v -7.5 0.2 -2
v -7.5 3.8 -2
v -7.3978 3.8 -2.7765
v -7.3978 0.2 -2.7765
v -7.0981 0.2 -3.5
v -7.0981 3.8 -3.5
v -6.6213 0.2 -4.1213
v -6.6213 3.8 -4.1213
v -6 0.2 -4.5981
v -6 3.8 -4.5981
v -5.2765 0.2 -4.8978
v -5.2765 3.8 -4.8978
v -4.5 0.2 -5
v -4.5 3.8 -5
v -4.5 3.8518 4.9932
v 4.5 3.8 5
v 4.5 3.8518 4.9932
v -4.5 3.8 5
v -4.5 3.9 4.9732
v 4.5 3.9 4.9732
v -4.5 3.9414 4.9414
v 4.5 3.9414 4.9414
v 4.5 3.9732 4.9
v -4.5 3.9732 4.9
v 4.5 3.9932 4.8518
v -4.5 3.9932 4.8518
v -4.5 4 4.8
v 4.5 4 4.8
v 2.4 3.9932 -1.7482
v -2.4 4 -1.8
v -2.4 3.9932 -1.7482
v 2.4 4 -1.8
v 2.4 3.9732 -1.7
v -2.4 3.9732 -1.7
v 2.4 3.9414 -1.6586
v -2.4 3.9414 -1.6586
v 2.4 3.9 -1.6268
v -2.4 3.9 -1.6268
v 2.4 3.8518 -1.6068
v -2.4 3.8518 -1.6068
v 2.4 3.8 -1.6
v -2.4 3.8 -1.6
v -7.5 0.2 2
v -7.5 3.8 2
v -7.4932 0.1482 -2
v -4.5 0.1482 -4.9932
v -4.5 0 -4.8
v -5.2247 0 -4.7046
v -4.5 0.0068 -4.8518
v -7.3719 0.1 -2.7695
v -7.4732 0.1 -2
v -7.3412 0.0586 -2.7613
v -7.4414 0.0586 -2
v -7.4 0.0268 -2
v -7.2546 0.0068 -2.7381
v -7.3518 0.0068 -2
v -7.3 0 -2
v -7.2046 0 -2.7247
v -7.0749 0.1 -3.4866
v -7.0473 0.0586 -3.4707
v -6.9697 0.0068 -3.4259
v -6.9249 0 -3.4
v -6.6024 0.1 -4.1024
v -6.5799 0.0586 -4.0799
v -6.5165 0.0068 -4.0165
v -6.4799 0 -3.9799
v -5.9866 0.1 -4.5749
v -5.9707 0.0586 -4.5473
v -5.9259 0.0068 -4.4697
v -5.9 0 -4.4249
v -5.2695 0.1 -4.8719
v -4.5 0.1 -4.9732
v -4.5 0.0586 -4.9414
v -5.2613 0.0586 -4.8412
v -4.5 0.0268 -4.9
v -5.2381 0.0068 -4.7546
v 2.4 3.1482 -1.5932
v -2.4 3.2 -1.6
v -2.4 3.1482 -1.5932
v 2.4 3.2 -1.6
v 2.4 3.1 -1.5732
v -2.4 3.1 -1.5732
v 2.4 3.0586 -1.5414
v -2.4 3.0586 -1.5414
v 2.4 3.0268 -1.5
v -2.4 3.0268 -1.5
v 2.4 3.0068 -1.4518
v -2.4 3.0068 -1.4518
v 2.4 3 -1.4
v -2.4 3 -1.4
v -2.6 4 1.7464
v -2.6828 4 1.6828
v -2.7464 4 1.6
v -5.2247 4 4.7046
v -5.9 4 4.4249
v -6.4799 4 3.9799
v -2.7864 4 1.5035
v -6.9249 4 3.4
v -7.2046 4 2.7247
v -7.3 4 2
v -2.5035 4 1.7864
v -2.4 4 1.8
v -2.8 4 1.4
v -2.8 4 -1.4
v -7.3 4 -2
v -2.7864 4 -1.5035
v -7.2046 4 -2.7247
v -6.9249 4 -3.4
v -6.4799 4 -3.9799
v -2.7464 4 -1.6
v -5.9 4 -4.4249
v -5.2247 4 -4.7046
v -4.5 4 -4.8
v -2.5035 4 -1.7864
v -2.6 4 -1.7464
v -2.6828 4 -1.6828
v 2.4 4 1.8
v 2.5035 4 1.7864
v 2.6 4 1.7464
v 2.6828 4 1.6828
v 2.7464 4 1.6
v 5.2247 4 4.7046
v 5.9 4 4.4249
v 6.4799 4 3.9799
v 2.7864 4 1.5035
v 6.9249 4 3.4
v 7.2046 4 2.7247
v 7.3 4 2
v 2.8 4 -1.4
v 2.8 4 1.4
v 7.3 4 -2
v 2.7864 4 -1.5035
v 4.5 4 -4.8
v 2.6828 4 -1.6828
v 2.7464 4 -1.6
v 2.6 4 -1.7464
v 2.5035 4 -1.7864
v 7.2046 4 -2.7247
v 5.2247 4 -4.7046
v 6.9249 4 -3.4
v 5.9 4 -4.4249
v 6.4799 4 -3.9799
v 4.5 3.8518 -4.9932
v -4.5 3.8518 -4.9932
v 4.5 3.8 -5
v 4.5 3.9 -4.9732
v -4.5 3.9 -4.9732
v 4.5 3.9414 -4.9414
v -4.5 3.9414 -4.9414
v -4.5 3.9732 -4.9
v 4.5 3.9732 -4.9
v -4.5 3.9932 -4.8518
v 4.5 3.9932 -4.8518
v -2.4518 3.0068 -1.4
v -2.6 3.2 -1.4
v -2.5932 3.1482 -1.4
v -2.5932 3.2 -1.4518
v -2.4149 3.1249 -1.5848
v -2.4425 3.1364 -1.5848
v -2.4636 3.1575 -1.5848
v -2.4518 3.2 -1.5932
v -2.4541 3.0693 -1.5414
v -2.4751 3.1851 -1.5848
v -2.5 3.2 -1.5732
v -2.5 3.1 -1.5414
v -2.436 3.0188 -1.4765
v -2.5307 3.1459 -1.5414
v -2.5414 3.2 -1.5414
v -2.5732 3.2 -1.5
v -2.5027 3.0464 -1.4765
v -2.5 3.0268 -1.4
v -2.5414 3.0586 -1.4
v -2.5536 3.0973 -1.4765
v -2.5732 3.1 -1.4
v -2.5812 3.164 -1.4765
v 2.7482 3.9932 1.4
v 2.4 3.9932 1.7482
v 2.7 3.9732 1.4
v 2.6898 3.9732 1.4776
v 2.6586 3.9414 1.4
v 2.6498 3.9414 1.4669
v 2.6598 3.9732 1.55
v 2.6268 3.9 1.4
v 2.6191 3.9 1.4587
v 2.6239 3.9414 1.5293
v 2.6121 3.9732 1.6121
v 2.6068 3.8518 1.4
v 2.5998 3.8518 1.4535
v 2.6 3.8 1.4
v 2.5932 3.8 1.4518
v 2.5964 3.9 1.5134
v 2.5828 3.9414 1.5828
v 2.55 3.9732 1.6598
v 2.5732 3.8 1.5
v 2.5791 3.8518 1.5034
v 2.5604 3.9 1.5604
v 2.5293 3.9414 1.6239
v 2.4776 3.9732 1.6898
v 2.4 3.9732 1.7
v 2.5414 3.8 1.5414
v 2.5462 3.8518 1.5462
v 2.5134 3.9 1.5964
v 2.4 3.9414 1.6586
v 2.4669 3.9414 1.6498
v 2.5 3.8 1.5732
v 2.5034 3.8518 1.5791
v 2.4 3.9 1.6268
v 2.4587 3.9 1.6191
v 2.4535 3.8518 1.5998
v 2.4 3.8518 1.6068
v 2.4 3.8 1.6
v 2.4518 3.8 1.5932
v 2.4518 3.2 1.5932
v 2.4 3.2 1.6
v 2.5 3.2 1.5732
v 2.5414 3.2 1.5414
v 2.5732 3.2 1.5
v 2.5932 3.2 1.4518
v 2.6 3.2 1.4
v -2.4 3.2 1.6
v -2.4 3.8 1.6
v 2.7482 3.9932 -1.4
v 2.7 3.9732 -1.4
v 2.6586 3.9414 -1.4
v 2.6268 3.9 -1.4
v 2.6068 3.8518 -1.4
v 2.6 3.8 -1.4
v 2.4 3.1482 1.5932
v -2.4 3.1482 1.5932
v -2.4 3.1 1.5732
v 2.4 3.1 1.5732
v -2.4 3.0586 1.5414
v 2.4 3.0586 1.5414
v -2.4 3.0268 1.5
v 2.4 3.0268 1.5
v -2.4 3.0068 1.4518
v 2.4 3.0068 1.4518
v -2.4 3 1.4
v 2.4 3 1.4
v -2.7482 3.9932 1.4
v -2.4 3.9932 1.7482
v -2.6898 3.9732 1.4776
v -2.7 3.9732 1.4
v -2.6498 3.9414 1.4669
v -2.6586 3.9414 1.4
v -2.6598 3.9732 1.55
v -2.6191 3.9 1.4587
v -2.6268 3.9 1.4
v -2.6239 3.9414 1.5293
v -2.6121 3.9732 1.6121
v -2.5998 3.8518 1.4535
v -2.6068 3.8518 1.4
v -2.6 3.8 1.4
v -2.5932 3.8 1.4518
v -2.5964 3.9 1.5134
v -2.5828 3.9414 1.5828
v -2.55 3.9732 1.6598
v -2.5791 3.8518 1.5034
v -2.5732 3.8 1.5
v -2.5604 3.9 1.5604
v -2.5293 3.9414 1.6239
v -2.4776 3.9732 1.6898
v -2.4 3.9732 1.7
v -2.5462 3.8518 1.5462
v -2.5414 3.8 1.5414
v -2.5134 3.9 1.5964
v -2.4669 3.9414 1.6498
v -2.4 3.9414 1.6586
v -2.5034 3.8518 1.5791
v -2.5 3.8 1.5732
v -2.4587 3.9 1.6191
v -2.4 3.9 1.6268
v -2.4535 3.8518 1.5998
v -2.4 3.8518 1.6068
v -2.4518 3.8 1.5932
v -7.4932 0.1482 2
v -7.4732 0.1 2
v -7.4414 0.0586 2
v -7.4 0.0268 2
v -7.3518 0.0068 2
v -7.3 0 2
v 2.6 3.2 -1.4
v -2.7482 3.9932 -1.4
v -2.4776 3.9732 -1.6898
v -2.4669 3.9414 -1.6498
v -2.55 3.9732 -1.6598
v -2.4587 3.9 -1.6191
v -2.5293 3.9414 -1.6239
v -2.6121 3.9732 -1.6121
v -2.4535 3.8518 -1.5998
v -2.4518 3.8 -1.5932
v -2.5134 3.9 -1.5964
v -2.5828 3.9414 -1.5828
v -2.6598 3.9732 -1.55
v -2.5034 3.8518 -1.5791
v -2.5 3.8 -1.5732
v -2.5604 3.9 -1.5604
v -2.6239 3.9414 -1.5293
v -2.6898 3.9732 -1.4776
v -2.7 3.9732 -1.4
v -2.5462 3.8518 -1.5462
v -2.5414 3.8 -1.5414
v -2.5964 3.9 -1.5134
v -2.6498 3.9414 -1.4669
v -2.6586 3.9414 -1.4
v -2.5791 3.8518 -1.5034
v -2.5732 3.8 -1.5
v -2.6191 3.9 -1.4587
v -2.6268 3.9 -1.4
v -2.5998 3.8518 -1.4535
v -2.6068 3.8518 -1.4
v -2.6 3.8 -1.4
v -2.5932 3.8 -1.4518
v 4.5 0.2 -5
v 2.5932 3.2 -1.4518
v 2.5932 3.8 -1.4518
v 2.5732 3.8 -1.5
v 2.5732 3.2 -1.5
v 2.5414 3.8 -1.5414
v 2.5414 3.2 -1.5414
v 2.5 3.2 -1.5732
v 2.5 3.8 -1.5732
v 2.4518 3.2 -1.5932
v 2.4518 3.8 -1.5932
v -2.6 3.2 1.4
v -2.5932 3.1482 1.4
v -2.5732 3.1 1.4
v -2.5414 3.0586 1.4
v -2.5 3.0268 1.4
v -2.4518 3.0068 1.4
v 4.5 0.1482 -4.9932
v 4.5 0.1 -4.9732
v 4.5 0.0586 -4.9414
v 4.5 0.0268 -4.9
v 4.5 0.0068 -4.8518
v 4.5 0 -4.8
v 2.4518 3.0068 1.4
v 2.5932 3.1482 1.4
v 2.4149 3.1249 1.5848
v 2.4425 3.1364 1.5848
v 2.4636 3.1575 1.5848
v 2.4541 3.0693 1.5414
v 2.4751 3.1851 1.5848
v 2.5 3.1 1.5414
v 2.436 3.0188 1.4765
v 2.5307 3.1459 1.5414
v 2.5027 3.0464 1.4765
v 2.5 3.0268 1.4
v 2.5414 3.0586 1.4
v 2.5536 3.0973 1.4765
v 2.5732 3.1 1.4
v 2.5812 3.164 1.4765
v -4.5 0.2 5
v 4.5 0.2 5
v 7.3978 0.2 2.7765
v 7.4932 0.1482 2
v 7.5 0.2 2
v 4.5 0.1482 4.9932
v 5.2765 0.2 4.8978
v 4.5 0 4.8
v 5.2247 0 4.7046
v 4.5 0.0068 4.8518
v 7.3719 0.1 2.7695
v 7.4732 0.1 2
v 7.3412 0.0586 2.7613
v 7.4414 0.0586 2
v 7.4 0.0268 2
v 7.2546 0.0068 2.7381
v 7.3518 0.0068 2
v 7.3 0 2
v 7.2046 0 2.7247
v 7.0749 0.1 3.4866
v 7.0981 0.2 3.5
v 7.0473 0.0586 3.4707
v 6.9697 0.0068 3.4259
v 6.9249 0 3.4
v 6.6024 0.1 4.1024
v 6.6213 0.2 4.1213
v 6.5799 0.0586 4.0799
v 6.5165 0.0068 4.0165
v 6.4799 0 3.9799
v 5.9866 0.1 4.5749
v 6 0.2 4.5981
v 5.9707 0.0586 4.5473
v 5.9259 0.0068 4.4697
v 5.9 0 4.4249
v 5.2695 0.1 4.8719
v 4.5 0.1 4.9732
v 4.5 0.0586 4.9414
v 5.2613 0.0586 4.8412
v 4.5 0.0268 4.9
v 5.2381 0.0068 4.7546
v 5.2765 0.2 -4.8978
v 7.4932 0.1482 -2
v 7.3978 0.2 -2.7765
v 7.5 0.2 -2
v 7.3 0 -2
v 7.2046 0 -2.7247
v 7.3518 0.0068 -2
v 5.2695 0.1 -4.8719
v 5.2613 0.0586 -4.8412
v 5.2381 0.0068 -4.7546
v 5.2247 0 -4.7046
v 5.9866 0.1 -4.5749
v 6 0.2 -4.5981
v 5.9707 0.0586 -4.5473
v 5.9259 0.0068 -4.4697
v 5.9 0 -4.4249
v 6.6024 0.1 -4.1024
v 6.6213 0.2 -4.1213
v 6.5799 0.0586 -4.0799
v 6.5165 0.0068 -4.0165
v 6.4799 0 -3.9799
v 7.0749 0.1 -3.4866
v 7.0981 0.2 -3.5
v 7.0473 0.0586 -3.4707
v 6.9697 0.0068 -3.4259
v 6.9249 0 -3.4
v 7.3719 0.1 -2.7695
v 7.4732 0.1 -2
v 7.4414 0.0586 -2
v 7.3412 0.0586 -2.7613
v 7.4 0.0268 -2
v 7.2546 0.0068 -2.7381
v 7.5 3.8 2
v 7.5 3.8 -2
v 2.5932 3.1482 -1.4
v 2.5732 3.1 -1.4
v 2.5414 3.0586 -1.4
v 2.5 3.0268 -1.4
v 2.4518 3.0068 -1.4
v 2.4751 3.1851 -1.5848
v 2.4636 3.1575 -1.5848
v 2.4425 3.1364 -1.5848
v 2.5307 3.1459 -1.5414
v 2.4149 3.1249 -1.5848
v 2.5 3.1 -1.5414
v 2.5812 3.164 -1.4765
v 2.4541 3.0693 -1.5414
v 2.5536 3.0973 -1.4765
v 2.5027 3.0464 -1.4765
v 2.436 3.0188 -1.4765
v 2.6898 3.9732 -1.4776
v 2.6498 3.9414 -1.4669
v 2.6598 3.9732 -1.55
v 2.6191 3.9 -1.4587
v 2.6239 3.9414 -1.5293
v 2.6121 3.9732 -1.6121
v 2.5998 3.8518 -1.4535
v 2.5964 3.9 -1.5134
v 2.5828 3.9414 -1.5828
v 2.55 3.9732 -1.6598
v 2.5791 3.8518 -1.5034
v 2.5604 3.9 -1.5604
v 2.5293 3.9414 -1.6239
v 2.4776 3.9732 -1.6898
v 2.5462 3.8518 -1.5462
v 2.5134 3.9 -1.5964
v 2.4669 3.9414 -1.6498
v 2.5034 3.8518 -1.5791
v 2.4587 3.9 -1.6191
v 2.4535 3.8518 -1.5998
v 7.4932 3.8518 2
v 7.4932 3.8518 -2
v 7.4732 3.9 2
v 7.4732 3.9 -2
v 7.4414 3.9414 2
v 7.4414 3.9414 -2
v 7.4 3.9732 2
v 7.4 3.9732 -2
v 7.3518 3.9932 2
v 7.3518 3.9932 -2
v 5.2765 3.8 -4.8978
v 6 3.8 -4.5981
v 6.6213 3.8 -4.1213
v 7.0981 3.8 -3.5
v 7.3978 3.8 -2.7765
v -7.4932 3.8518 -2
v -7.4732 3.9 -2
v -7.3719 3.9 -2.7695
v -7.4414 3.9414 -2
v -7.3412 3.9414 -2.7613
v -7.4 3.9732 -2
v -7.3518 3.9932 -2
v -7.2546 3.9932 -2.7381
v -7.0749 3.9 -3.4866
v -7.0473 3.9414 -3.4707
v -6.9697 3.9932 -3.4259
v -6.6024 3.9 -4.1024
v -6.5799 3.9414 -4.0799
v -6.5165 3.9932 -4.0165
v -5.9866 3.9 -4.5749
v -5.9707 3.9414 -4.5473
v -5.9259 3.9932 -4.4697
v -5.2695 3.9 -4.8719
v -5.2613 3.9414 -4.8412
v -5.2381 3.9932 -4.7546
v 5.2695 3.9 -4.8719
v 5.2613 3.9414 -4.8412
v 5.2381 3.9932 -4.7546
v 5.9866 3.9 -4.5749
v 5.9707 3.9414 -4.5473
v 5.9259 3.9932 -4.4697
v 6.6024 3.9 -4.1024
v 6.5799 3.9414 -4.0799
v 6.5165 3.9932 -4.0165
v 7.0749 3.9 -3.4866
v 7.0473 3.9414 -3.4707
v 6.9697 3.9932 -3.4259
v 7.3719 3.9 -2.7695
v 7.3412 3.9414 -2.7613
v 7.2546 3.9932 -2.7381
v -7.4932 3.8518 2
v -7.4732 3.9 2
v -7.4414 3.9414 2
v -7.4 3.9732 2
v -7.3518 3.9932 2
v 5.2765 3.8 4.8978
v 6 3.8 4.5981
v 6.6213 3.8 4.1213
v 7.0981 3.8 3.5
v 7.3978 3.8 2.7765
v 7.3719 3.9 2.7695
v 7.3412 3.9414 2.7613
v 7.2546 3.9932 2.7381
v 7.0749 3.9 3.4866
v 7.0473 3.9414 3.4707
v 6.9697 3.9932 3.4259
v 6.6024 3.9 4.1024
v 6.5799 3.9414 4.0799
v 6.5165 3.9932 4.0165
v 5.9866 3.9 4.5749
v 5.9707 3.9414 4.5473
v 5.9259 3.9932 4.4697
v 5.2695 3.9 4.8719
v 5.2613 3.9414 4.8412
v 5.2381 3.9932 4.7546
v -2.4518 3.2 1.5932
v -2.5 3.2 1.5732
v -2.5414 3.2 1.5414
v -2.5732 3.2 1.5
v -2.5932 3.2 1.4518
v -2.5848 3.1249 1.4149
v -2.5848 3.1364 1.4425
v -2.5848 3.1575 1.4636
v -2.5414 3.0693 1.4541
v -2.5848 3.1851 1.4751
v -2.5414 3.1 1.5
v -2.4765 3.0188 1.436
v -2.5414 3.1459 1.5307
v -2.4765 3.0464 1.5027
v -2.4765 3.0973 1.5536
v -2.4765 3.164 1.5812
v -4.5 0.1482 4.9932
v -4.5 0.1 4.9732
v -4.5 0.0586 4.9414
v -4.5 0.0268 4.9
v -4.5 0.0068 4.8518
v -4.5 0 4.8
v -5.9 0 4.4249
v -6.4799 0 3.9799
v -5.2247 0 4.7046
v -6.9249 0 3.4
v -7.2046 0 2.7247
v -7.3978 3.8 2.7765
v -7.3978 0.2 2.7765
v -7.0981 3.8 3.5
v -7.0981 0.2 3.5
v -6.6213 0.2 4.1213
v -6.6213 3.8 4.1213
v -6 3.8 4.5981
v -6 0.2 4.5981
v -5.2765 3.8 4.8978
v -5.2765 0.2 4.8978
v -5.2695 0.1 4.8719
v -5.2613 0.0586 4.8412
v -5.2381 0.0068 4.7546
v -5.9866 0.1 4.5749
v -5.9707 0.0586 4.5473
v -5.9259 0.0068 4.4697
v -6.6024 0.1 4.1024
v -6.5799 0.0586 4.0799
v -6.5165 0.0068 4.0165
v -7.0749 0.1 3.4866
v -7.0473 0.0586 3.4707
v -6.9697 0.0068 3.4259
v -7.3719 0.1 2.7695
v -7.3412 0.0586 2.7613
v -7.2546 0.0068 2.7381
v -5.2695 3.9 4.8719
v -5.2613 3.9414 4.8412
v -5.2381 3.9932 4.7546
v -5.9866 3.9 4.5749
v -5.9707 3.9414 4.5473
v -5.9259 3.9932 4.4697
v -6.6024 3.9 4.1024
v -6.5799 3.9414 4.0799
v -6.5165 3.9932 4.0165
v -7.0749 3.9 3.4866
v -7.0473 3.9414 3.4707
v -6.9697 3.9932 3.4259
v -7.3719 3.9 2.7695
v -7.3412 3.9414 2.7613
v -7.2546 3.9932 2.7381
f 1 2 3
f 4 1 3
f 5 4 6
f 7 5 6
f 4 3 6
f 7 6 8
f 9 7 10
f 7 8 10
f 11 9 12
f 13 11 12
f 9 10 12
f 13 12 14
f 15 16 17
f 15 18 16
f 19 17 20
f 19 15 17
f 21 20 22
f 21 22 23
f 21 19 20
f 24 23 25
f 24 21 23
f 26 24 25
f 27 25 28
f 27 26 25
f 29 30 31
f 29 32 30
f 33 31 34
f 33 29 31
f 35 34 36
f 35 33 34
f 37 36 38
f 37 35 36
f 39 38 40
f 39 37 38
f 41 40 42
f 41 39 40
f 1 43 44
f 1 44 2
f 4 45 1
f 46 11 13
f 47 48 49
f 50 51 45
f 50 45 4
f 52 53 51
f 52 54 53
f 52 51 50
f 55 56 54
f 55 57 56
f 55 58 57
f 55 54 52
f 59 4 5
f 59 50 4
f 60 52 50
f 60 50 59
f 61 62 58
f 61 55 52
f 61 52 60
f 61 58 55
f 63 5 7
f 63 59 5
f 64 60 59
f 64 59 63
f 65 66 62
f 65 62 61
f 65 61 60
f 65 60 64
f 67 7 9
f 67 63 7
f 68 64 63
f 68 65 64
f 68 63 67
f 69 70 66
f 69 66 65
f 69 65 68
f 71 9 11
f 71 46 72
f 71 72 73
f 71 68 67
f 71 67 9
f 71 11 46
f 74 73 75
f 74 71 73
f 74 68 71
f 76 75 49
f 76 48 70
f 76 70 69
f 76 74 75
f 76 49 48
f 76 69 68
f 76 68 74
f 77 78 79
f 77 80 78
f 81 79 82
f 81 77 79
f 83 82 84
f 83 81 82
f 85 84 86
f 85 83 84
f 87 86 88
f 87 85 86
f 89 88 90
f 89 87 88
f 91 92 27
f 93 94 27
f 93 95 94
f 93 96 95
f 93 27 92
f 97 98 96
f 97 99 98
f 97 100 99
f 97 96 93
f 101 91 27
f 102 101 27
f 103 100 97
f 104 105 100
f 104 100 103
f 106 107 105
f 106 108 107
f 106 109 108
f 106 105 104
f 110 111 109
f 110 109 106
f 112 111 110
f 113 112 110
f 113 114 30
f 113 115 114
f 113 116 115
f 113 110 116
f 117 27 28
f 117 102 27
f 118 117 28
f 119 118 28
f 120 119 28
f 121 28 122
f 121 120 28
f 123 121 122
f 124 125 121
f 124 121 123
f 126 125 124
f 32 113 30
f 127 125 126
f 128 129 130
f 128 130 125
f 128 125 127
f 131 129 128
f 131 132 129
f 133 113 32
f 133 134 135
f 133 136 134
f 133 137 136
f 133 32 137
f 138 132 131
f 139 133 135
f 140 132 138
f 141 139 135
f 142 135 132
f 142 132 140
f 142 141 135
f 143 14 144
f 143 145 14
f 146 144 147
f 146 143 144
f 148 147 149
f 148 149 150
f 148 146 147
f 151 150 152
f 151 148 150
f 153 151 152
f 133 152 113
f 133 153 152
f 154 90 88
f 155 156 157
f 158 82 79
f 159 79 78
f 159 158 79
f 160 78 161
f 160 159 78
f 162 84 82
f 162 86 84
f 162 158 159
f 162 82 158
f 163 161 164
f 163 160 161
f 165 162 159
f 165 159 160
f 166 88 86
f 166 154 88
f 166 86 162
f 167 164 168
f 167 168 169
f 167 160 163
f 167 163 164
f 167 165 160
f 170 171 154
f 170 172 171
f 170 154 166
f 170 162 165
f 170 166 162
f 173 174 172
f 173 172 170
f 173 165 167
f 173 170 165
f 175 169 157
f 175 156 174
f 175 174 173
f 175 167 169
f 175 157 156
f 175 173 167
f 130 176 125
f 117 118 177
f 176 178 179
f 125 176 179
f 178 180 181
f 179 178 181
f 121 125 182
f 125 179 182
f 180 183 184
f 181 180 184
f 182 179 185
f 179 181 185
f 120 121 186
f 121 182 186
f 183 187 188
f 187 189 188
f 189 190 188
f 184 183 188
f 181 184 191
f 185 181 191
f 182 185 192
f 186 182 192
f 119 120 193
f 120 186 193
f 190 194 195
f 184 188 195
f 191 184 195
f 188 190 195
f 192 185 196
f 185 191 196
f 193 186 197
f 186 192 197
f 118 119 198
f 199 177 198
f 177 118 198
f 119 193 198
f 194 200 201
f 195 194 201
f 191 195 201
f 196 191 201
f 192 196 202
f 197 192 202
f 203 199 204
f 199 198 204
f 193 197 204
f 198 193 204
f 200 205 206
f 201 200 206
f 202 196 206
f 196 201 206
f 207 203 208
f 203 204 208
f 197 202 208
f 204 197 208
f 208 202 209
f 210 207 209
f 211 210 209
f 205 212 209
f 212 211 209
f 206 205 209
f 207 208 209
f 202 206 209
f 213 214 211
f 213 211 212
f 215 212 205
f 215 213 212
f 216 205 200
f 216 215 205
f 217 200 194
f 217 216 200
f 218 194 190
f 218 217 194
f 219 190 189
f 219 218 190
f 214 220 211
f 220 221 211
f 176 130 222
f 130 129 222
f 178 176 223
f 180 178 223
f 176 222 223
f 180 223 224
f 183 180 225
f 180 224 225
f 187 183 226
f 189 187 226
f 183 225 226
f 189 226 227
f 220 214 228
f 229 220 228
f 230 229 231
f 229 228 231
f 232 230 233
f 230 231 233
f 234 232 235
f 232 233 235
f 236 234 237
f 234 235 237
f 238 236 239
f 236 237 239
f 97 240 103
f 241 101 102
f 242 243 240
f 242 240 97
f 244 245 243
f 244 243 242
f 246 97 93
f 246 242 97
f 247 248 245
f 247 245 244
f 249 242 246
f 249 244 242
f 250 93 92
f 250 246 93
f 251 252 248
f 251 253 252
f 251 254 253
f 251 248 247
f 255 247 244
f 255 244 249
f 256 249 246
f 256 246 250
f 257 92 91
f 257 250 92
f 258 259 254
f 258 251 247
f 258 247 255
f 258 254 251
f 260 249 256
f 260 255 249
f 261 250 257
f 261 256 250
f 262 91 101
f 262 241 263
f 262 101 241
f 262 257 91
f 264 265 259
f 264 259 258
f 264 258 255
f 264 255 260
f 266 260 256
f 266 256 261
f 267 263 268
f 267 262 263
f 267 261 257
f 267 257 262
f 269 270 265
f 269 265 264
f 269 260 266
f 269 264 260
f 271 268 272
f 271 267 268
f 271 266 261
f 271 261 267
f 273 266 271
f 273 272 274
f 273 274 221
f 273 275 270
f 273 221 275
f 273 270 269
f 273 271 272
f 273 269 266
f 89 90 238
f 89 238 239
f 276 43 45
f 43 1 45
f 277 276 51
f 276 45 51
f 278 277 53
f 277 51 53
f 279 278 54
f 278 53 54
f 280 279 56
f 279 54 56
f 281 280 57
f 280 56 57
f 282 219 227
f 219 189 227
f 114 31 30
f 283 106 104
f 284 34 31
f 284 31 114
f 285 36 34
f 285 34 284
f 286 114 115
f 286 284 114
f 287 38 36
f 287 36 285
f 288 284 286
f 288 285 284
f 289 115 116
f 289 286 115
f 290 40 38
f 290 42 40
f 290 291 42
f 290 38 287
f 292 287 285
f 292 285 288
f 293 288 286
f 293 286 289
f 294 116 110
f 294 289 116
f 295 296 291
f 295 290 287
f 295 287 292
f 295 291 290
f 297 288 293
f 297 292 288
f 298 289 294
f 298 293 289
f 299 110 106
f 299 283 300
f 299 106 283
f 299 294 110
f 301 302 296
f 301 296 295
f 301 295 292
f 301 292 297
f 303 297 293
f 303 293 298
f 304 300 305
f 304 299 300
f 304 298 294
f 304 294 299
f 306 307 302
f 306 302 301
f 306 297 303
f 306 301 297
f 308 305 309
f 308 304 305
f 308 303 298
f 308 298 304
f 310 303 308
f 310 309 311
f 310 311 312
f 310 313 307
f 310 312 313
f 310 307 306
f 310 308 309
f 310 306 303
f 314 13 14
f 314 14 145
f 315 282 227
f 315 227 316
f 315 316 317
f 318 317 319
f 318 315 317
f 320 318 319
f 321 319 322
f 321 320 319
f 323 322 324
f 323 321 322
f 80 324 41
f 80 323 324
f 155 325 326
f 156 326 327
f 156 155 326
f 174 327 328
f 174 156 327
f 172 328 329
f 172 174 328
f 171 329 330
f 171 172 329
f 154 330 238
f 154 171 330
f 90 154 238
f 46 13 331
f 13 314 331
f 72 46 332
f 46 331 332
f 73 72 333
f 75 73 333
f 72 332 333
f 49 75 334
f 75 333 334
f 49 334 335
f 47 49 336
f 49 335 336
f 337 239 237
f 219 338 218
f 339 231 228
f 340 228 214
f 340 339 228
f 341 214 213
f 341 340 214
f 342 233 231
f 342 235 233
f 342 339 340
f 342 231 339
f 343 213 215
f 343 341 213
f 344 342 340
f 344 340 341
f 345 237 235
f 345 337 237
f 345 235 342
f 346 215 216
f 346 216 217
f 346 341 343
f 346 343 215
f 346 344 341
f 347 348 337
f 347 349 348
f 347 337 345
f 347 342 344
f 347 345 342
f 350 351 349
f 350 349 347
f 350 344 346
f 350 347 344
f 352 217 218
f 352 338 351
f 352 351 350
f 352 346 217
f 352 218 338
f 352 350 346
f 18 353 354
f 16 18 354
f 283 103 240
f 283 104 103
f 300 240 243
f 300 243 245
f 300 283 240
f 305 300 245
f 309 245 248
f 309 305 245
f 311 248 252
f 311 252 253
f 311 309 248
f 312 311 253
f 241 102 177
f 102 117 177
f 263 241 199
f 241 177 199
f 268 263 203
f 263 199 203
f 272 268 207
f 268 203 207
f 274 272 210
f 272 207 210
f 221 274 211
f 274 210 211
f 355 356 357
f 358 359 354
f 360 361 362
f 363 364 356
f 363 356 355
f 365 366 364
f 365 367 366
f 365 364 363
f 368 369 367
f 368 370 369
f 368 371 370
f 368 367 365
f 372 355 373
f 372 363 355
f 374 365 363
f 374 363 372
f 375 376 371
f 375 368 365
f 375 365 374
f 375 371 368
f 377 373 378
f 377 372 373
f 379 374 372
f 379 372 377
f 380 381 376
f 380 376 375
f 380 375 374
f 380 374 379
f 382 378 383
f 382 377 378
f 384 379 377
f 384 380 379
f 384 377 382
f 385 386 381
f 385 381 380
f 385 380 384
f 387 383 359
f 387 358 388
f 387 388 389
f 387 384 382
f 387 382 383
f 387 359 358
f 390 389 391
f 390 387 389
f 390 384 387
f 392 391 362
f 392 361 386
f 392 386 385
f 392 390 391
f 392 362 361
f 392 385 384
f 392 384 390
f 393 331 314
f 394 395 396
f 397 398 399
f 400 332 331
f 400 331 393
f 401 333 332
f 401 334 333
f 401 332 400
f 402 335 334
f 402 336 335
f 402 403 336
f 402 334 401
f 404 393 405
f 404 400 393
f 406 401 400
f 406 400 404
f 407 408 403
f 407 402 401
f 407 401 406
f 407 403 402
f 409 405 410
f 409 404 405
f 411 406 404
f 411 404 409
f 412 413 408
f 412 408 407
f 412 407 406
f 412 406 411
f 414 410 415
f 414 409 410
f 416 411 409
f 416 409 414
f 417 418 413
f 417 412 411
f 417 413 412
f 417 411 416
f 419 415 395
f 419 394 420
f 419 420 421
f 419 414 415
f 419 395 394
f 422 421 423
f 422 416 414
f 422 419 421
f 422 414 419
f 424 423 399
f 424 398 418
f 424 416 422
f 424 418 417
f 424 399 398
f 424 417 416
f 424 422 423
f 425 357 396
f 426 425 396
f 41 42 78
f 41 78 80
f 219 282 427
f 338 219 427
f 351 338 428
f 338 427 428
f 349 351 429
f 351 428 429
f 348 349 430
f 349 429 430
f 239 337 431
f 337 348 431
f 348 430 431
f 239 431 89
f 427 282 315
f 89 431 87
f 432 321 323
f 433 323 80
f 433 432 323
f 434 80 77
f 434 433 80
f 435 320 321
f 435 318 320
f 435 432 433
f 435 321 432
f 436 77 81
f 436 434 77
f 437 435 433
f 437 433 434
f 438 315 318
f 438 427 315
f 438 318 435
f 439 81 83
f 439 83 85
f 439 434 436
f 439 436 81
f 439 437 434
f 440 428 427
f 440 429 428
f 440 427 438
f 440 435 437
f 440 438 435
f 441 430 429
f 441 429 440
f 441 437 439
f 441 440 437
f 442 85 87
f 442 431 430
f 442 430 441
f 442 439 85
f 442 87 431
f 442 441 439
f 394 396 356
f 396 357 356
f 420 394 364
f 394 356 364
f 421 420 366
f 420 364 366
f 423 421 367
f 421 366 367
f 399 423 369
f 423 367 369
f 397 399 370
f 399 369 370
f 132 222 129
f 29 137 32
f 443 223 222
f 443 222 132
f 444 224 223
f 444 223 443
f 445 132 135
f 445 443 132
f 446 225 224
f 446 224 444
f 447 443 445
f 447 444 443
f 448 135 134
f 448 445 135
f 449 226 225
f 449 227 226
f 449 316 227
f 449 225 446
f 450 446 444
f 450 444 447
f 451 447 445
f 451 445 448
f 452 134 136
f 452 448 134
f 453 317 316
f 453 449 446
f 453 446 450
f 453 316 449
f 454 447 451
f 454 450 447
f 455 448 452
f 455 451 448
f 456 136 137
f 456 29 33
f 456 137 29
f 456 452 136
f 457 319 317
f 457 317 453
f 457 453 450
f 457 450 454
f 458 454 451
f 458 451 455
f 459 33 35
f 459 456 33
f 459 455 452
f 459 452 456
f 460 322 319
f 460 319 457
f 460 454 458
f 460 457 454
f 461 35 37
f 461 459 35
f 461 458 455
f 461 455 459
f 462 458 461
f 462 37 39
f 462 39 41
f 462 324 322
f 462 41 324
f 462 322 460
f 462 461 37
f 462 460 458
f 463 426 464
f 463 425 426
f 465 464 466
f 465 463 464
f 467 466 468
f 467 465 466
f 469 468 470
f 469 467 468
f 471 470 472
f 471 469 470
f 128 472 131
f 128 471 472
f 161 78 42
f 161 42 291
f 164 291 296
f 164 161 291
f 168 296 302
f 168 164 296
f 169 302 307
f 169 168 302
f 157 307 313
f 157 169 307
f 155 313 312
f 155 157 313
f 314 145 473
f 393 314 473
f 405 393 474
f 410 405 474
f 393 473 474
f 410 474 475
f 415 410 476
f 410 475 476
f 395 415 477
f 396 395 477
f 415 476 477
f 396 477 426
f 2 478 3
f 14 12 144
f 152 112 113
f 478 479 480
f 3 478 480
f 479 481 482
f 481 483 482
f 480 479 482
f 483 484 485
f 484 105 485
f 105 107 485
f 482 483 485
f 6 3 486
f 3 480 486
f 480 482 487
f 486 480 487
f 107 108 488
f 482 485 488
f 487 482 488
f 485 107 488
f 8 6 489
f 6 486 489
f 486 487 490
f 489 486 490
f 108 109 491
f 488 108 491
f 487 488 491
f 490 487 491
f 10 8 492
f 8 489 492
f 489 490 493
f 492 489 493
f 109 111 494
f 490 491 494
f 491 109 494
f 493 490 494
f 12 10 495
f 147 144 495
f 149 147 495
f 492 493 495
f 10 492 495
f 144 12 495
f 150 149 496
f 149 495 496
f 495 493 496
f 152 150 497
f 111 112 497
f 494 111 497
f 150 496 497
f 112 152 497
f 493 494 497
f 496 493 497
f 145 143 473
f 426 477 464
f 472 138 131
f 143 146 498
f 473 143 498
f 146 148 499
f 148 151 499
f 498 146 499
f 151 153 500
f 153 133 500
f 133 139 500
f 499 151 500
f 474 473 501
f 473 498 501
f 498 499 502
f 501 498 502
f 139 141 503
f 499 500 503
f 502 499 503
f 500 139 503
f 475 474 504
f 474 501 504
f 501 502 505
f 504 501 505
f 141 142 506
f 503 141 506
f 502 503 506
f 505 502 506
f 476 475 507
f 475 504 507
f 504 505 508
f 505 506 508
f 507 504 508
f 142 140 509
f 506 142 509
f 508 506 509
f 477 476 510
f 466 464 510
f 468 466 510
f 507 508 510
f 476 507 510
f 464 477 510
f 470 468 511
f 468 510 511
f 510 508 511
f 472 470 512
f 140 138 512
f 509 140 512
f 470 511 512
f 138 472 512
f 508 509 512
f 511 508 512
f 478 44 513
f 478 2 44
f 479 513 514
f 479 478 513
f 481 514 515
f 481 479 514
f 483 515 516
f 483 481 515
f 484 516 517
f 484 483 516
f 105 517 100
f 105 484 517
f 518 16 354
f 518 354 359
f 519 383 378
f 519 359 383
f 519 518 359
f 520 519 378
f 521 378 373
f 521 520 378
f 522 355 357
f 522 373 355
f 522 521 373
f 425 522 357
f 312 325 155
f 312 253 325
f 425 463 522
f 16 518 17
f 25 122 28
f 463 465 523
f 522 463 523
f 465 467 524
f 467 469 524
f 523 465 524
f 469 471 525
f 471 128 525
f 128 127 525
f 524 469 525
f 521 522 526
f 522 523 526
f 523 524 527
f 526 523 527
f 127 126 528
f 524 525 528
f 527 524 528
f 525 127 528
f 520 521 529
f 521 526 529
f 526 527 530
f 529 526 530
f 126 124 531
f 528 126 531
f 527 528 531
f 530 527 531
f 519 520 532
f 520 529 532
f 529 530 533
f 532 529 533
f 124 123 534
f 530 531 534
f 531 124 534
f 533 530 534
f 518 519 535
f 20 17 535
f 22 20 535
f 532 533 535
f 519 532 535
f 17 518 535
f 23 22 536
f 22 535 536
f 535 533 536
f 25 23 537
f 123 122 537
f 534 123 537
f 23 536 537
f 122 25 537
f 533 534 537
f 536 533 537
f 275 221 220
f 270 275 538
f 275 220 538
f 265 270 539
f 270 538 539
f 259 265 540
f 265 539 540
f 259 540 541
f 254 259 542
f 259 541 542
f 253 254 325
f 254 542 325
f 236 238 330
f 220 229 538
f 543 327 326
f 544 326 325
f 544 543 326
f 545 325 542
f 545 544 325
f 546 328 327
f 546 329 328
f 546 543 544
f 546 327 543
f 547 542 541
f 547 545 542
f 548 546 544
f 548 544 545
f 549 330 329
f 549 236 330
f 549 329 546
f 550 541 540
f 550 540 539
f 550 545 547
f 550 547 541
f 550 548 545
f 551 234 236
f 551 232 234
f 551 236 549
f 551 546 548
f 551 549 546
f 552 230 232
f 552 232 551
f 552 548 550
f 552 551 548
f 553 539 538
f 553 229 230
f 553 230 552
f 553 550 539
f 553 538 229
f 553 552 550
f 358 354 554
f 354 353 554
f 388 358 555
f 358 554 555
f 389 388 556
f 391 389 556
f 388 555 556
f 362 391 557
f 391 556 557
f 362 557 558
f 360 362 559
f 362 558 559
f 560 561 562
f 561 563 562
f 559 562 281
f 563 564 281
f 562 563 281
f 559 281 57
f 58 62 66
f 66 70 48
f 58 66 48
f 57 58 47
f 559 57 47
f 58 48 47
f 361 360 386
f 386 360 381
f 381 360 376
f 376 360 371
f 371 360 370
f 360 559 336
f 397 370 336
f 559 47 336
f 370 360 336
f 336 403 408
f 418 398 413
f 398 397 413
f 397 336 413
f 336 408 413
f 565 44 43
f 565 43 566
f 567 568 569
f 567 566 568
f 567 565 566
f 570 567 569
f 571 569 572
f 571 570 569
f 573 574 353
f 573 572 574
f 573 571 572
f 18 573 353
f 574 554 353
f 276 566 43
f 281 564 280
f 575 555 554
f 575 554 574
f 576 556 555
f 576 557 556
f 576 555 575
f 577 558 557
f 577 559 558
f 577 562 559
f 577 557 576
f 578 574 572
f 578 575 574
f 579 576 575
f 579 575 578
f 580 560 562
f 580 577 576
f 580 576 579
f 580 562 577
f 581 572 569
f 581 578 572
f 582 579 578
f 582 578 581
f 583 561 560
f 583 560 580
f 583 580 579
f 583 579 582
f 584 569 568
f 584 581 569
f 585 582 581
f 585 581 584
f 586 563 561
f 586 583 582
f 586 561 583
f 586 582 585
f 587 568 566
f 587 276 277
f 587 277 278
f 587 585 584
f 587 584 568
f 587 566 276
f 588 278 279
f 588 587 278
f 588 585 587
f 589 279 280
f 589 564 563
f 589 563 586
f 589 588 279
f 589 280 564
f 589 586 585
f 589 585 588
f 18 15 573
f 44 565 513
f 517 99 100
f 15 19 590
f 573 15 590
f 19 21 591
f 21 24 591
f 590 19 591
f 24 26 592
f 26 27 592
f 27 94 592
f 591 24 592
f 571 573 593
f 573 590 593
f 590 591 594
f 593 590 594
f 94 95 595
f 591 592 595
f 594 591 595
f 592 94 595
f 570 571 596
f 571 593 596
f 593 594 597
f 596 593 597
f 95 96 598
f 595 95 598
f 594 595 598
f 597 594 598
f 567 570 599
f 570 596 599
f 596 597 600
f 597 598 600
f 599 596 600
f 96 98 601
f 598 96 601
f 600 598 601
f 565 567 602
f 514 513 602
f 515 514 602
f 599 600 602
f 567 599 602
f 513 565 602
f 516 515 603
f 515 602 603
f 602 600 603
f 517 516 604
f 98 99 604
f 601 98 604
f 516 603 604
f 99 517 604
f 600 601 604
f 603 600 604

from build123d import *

# Parameters (mm, degrees)
SKETCH1_W           = 15
SKETCH1_H           = 10
BOSS_EXTRUDE1_DEPTH = 4
SKETCH2_W           = 5.2
SKETCH2_H           = 3.2
CUT_EXTRUDE1_DEPTH  = 1
FILLET1_R           = 3
FILLET2_R           = 0.2


with BuildPart() as part:
    # Sketch1 → Boss-Extrude1 (new body)
    with BuildSketch(Plane(origin=(0, 0, 0), x_dir=(1, 0, 0), z_dir=(0, 1, 0))):
        Rectangle(SKETCH1_W, SKETCH1_H)
    extrude(amount=BOSS_EXTRUDE1_DEPTH)

    # Sketch2 → Cut-Extrude1 (cut)
    with BuildSketch(Plane(origin=(0, 4, 0), x_dir=(1, 0, 0), z_dir=(0, 1, 0))):
        Rectangle(SKETCH2_W, SKETCH2_H)
    extrude(amount=-CUT_EXTRUDE1_DEPTH, mode=Mode.SUBTRACT)

    # Fillet1
    fillet1_edges = [part.edges().sort_by_distance(p)[0] for p in [
        (7.5, 2, 5),
        (-7.5, 2, 5),
        (-7.5, 2, -5),
        (7.5, 2, -5),
    ]]
    fillet(fillet1_edges, radius=FILLET1_R)

    # Fillet2
    fillet2_edges = [part.edges().sort_by_distance(p)[0] for p in [
        (2.6, 3, 0),
        (2.6, 3.5, -1.6),
        (0, 3, 1.6),
        (2.6, 3.5, 1.6),
        (-2.6, 3, 0),
        (-2.6, 3.5, 1.6),
        (0, 3, -1.6),
        (-2.6, 3.5, -1.6),
        (2.6, 4, 0),
        (0, 4, -1.6),
        (-2.6, 4, 0),
        (0, 4, 1.6),
        (-7.5, 0, 0),
        (-7.5, 4, 0),
        (7.5, 0, 0),
        (0, 0, 5),
        (0, 0, -5),
        (6.621320344, 0, 4.121320344),
        (-6.621320344, 0, 4.121320344),
        (6.621320344, 0, -4.121320344),
        (-6.621320344, 0, -4.121320344),
        (0, 4, -5),
        (7.5, 4, 0),
        (0, 4, 5),
        (6.621320344, 4, 4.121320344),
        (-6.621320344, 4, 4.121320344),
        (6.621320344, 4, -4.121320344),
        (-6.621320344, 4, -4.121320344),
    ]]
    fillet(fillet2_edges, radius=FILLET2_R)


solid = part.part
